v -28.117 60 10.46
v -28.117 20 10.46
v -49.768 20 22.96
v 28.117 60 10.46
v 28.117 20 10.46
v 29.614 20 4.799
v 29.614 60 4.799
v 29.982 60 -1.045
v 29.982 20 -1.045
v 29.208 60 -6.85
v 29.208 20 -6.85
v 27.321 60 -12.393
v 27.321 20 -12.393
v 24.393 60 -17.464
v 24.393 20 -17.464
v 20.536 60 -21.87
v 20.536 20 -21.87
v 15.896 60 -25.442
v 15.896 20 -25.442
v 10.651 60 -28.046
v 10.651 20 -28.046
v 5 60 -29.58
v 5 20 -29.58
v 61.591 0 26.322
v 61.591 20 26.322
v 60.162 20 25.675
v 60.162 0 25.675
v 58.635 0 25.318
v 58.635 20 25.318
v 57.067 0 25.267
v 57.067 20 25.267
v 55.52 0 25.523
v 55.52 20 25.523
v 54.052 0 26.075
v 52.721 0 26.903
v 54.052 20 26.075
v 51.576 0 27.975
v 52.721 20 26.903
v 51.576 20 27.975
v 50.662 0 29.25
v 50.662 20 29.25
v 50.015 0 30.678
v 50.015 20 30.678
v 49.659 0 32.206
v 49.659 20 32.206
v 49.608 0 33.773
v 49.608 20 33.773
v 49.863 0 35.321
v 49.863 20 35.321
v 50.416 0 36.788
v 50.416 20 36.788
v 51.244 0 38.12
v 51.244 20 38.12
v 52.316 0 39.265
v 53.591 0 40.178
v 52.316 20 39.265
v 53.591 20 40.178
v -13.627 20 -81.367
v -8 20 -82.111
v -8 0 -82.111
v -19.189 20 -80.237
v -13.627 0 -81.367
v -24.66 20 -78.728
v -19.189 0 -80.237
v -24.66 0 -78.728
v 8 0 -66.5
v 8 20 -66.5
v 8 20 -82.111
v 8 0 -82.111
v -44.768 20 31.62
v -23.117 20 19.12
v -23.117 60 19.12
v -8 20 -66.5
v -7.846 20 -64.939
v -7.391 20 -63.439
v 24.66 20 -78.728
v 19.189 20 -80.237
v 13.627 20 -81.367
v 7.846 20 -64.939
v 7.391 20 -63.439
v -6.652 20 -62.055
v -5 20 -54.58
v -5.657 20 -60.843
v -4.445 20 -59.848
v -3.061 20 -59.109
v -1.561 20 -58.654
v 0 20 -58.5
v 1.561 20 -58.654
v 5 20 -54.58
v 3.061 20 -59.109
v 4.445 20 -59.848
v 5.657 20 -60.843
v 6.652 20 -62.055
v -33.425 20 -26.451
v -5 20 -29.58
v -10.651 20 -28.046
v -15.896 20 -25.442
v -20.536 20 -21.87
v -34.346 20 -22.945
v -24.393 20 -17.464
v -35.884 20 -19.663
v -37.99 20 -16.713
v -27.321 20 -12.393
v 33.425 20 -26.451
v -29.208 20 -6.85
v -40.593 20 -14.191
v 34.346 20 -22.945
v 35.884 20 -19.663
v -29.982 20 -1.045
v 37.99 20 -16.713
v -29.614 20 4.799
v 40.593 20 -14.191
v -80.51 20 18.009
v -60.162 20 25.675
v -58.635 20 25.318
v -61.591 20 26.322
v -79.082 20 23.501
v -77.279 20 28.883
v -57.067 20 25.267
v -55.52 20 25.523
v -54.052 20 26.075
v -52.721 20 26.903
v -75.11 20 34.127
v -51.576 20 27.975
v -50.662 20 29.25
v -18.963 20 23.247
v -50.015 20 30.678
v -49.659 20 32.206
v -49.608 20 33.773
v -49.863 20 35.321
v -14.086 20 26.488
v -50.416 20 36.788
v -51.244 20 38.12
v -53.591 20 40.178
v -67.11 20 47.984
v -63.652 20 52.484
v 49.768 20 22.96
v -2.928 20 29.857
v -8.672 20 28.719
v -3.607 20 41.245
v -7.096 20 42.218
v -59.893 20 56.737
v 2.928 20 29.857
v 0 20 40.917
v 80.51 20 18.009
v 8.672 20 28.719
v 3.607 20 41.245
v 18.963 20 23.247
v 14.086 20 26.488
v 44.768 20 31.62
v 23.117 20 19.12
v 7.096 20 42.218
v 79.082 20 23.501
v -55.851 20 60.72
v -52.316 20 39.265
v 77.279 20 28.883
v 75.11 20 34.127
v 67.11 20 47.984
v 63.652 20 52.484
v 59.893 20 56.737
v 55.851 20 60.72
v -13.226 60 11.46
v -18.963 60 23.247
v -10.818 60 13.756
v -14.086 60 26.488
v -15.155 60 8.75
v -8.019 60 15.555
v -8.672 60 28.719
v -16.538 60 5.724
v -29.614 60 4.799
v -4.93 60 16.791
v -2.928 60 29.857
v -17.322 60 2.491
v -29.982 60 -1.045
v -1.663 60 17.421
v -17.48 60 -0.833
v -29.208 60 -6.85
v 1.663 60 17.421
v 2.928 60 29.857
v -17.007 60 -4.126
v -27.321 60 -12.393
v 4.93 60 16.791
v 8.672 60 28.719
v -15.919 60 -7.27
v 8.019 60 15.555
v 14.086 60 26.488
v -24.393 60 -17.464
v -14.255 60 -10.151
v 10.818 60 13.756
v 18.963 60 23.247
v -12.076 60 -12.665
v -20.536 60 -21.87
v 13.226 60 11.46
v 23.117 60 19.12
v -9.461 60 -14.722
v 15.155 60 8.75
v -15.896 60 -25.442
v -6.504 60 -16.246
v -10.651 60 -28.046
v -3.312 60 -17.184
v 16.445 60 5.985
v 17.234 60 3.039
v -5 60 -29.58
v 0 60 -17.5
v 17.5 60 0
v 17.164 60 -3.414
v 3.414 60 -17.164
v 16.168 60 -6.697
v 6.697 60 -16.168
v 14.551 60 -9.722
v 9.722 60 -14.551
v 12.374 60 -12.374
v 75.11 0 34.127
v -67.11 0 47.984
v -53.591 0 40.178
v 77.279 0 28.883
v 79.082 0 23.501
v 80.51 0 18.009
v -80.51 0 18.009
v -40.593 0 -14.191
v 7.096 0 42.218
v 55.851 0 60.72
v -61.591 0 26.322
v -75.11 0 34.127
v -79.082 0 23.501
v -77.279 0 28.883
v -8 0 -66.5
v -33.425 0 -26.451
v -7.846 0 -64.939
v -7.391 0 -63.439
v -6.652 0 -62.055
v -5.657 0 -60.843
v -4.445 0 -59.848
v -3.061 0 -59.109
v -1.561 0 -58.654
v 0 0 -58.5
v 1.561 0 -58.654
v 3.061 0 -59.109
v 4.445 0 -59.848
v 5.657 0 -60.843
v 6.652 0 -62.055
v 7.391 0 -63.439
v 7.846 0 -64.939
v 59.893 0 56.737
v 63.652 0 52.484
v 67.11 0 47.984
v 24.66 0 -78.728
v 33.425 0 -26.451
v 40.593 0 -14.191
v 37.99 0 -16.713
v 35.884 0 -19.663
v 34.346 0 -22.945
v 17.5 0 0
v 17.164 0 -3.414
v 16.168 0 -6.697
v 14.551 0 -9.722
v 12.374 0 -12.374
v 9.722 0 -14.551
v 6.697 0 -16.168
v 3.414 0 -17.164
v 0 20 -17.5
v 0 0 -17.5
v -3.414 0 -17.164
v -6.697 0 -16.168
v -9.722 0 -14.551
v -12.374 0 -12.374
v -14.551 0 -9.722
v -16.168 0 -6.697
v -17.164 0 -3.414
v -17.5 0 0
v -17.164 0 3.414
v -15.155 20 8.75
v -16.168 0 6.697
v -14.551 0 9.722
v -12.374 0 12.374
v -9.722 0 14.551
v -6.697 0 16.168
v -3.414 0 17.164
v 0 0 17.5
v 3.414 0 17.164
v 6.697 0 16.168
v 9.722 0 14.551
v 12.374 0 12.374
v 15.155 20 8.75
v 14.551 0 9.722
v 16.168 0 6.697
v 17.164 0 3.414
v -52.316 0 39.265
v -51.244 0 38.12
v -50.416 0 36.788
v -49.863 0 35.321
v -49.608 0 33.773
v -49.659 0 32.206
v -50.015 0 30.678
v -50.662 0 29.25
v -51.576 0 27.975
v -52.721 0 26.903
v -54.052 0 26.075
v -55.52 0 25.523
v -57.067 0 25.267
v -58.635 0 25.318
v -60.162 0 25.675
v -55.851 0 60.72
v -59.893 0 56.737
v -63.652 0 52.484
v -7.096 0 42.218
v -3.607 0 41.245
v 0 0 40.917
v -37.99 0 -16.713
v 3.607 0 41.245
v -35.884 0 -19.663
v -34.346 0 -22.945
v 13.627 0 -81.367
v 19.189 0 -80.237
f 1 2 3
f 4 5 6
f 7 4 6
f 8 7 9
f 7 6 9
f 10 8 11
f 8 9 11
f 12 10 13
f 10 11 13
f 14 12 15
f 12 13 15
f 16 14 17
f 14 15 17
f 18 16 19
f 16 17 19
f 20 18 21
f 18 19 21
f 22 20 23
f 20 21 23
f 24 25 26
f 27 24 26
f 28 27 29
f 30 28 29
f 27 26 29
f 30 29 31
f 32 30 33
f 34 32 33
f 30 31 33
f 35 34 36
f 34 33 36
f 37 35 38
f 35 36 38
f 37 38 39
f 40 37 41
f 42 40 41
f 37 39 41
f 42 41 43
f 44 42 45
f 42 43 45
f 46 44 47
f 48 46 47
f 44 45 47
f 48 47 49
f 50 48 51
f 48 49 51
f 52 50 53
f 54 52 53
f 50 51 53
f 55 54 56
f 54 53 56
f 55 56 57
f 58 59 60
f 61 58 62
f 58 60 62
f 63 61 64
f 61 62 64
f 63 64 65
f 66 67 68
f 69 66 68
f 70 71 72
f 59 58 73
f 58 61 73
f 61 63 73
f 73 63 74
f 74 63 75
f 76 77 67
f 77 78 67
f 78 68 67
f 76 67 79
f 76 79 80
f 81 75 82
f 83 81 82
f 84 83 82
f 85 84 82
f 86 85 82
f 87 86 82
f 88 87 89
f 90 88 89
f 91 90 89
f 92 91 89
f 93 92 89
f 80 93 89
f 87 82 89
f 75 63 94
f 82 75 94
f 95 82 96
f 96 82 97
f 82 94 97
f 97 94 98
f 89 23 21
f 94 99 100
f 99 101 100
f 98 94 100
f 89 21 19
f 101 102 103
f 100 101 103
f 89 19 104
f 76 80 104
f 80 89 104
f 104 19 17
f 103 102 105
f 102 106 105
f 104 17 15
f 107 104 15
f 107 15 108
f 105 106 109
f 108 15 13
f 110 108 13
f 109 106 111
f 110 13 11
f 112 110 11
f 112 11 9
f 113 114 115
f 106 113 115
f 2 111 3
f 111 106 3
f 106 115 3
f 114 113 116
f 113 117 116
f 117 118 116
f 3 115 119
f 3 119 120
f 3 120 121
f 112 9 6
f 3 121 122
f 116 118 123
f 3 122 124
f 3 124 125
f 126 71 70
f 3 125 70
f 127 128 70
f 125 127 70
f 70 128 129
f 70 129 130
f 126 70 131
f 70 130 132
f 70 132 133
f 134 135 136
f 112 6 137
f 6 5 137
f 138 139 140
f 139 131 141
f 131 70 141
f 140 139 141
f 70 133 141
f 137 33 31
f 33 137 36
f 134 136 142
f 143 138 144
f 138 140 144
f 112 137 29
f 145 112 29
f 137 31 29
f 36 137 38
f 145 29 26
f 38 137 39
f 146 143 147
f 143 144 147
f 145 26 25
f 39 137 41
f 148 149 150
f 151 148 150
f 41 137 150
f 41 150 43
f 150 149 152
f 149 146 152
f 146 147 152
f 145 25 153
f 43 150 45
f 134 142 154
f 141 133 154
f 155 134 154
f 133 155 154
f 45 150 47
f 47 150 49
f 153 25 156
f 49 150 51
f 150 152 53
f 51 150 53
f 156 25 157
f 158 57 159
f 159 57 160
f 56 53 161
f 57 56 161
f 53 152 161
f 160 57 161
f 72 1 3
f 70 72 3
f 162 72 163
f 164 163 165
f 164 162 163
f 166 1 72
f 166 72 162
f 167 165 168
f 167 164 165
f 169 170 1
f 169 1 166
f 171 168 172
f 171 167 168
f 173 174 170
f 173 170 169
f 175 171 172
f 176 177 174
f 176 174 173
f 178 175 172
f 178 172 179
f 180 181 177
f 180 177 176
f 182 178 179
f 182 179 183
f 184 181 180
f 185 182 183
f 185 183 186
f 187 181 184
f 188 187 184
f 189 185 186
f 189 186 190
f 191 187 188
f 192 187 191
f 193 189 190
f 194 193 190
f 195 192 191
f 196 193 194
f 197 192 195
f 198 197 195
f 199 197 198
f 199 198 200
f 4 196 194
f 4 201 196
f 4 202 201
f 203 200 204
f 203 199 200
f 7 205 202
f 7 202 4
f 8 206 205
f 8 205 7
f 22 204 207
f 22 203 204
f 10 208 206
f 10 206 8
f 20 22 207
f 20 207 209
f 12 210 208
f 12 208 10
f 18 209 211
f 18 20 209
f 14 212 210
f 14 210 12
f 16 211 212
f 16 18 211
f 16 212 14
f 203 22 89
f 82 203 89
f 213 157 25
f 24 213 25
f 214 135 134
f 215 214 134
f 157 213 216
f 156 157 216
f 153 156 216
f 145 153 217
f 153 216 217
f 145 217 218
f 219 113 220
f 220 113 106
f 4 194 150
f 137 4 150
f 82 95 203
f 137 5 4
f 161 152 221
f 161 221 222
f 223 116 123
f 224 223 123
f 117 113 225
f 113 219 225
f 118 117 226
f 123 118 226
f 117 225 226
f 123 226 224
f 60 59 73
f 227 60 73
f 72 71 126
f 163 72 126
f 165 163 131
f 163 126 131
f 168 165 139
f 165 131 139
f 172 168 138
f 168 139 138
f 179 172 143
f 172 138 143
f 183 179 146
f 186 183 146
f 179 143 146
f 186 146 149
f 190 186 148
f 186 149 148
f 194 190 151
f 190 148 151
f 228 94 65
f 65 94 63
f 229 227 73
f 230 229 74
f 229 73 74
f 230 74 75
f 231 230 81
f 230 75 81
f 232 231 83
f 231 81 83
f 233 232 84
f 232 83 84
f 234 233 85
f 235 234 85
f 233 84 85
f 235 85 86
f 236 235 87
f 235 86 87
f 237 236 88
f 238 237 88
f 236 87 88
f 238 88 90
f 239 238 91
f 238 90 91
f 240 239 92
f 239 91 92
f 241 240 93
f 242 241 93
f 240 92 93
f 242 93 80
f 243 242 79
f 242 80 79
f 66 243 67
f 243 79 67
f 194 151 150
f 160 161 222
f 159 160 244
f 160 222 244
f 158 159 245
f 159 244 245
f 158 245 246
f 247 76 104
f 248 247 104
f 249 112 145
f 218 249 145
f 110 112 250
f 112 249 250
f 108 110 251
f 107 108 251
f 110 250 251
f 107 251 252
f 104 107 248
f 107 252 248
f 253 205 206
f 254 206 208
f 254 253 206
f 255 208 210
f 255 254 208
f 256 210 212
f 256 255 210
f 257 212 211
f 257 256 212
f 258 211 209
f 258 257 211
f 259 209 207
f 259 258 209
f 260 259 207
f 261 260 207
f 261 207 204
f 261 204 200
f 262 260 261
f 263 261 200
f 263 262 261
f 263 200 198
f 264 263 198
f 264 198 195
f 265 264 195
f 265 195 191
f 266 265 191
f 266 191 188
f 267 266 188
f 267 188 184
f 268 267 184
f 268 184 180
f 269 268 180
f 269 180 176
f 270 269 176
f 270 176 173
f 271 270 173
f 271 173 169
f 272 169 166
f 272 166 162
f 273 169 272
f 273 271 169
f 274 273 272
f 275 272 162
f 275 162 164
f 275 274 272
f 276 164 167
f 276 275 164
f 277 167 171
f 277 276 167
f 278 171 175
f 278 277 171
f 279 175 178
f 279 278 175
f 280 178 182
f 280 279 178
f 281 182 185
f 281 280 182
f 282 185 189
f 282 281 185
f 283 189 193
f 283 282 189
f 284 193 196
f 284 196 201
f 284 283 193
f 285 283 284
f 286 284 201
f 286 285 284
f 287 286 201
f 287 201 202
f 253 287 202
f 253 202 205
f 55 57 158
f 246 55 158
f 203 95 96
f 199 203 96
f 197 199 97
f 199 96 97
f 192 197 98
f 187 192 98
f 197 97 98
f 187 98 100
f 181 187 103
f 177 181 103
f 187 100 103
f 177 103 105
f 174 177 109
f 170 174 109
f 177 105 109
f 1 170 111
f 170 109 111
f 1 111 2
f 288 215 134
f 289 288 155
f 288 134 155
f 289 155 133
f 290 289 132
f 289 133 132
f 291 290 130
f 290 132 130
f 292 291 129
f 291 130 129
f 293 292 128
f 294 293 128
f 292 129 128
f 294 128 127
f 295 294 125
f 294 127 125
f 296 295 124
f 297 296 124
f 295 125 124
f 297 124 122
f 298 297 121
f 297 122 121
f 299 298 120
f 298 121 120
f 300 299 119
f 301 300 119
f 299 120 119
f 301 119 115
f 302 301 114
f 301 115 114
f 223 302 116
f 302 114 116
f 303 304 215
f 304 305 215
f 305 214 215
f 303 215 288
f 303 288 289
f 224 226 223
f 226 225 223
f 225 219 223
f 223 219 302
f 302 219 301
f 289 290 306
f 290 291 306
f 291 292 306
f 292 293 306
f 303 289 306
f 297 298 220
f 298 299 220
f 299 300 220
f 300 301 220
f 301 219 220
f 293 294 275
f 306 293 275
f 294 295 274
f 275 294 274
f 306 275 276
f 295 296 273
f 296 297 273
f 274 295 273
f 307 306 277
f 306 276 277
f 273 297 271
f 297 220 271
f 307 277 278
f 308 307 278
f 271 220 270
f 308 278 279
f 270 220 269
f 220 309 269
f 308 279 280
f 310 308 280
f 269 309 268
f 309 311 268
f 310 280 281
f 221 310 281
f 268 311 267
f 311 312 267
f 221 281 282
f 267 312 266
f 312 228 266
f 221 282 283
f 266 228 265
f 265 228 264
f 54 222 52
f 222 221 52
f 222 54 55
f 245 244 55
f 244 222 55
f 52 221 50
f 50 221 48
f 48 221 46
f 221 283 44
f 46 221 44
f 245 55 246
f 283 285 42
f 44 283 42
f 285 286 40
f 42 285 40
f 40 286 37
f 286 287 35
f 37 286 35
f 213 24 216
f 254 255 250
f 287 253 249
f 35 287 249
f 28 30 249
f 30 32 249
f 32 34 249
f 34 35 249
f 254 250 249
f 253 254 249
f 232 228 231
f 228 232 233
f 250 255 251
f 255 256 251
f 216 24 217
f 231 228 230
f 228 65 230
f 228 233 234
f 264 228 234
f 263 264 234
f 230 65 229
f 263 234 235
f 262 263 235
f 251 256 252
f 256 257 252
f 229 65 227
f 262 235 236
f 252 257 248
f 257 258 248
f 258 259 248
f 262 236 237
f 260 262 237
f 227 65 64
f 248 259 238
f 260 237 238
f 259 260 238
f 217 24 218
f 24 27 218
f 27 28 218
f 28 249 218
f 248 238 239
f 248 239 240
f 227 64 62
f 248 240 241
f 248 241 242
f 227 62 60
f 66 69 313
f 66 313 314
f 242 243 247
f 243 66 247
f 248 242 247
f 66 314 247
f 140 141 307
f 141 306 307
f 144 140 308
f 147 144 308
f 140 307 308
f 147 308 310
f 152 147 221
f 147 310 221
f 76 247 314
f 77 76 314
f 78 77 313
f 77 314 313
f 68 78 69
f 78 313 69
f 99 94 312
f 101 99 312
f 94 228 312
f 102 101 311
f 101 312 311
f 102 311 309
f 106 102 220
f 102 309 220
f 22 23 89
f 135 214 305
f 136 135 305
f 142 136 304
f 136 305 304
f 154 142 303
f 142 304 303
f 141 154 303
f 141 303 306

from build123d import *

# Parameters (mm, degrees)
SKETCH1_R           = 82.5
SKETCH1_R_2         = 30
BOSS_EXTRUDE2_DEPTH = 20
SKETCH1_4_R         = 30
SKETCH1_4_R_2       = 17.5
BOSS_EXTRUDE3_DEPTH = 60
SKETCH3_W           = 50
SKETCH3_H           = 40
BOSS_EXTRUDE4_DEPTH = 5
CIRPATTERN1_COUNT   = 3
CUT_EXTRUDE5_DEPTH  = 10
CIRPATTERN4_COUNT   = 3
CUT_EXTRUDE7_DEPTH  = 124.338963835
CIRPATTERN5_COUNT   = 3
CUT_EXTRUDE8_DEPTH  = 124.338963835
FILLET1_R           = 20


with BuildPart() as part:
    # Sketch1 → Boss-Extrude2 (new body)
    with BuildSketch(Plane(origin=(0, 0, 0), x_dir=(1, 0, 0), z_dir=(0, 1, 0))):
        Circle(SKETCH1_R)
        Circle(SKETCH1_R_2, mode=Mode.SUBTRACT)
    extrude(amount=BOSS_EXTRUDE2_DEPTH)

    # Sketch1<4> → Boss-Extrude3 (add)
    with BuildSketch(Plane(origin=(0, 0, 0), x_dir=(1, 0, 0), z_dir=(0, 1, 0))):
        Circle(SKETCH1_4_R)
        Circle(SKETCH1_4_R_2, mode=Mode.SUBTRACT)
    extrude(amount=BOSS_EXTRUDE3_DEPTH)

    # Sketch3 → Boss-Extrude4 (add, symmetric)
    with BuildSketch(Plane(origin=(0, 0, 0), x_dir=(0, 0, -1), z_dir=(1, 0, 0))):
        with Locations((42.5, 40)):
            Rectangle(SKETCH3_W, SKETCH3_H)
    boss_extrude4 = extrude(amount=BOSS_EXTRUDE4_DEPTH, both=True)

    # CirPattern1: Boss-Extrude4 ×3 about axis
    cirpattern1_axis = Axis((0, 60, 0), (0, 1, 0))
    for i in range(1, CIRPATTERN1_COUNT):
        add(boss_extrude4.rotate(cirpattern1_axis, i * 360 / CIRPATTERN1_COUNT))

    # Sketch15 → Cut-Extrude5 (cut)
    with BuildSketch(Plane(origin=(5, 0, 0), x_dir=(0, 0, -1), z_dir=(1, 0, 0))):
        Polygon((29.580398915, 60), (54.580398915, 20), (67.5, 20), (67.5, 60), align=None)
    cut_extrude5 = extrude(amount=-CUT_EXTRUDE5_DEPTH, mode=Mode.SUBTRACT)

    # CirPattern4: Cut-Extrude5 ×3 about axis
    cirpattern4_axis = Axis((0, 60, 0), (0, 1, 0))
    for i in range(1, CIRPATTERN4_COUNT):
        add(cut_extrude5.rotate(cirpattern4_axis, i * 360 / CIRPATTERN4_COUNT), mode=Mode.SUBTRACT)

    # Sketch22 → Cut-Extrude7 (cut, through all)
    with BuildSketch(Plane(origin=(0, 20, 0), x_dir=(1, 0, 0), z_dir=(0, 1, 0))):
        with BuildLine():
            Line((8, 66.5), (8, 82.111205082))
            ThreePointArc((8, 82.111205082), (0, 82.5), (-8, 82.111205082))
            Line((-8, 82.111205082), (-8, 66.5))
            ThreePointArc((-8, 66.5), (0, 58.5), (8, 66.5))
        make_face()
    cut_extrude7 = extrude(amount=-CUT_EXTRUDE7_DEPTH, mode=Mode.SUBTRACT)

    # CirPattern5: Cut-Extrude7 ×3 about axis
    cirpattern5_axis = Axis((0, 60, 0), (0, 1, 0))
    for i in range(1, CIRPATTERN5_COUNT):
        add(cut_extrude7.rotate(cirpattern5_axis, i * 360 / CIRPATTERN5_COUNT), mode=Mode.SUBTRACT)

    # Sketch29 → Cut-Extrude8 (cut, through all)
    with BuildSketch(Plane(origin=(0, 20, 0), x_dir=(1, 0, 0), z_dir=(0, 1, 0))):
        with BuildLine():
            Line((-80.510468766, -18.008731746), (-34.681233917, 18.959795028))
            Line((-34.681233917, 18.959795028), (-24.659817795, 78.728288349))
            ThreePointArc((-24.659817795, 78.728288349), (-71.447253677, 41.249726568), (-80.510468766, -18.008731746))
        make_face()
        with BuildLine():
            Line((24.659817795, 78.728288349), (34.681233917, 18.959795028))
            Line((34.681233917, 18.959795028), (80.510468766, -18.008731746))
            ThreePointArc((80.510468766, -18.008731746), (71.447253677, 41.249726568), (24.659817795, 78.728288349))
        make_face()
        with BuildLine():
            Line((-55.850650713, -60.720299859), (0, -39.52545779))
            Line((0, -39.52545779), (55.850650713, -60.720299859))
            ThreePointArc((55.850650713, -60.720299859), (0, -82.5), (-55.850650713, -60.720299859))
        make_face()
    extrude(amount=-CUT_EXTRUDE8_DEPTH, mode=Mode.SUBTRACT)

    # Fillet1
    fillet1_edges = [part.edges().sort_by_distance(p)[0] for p in [
        (-34.681233917, 10, -18.959795028),
        (0, 10, 39.52545779),
        (34.681233917, 10, -18.959795028),
    ]]
    fillet(fillet1_edges, radius=FILLET1_R)


solid = part.part
